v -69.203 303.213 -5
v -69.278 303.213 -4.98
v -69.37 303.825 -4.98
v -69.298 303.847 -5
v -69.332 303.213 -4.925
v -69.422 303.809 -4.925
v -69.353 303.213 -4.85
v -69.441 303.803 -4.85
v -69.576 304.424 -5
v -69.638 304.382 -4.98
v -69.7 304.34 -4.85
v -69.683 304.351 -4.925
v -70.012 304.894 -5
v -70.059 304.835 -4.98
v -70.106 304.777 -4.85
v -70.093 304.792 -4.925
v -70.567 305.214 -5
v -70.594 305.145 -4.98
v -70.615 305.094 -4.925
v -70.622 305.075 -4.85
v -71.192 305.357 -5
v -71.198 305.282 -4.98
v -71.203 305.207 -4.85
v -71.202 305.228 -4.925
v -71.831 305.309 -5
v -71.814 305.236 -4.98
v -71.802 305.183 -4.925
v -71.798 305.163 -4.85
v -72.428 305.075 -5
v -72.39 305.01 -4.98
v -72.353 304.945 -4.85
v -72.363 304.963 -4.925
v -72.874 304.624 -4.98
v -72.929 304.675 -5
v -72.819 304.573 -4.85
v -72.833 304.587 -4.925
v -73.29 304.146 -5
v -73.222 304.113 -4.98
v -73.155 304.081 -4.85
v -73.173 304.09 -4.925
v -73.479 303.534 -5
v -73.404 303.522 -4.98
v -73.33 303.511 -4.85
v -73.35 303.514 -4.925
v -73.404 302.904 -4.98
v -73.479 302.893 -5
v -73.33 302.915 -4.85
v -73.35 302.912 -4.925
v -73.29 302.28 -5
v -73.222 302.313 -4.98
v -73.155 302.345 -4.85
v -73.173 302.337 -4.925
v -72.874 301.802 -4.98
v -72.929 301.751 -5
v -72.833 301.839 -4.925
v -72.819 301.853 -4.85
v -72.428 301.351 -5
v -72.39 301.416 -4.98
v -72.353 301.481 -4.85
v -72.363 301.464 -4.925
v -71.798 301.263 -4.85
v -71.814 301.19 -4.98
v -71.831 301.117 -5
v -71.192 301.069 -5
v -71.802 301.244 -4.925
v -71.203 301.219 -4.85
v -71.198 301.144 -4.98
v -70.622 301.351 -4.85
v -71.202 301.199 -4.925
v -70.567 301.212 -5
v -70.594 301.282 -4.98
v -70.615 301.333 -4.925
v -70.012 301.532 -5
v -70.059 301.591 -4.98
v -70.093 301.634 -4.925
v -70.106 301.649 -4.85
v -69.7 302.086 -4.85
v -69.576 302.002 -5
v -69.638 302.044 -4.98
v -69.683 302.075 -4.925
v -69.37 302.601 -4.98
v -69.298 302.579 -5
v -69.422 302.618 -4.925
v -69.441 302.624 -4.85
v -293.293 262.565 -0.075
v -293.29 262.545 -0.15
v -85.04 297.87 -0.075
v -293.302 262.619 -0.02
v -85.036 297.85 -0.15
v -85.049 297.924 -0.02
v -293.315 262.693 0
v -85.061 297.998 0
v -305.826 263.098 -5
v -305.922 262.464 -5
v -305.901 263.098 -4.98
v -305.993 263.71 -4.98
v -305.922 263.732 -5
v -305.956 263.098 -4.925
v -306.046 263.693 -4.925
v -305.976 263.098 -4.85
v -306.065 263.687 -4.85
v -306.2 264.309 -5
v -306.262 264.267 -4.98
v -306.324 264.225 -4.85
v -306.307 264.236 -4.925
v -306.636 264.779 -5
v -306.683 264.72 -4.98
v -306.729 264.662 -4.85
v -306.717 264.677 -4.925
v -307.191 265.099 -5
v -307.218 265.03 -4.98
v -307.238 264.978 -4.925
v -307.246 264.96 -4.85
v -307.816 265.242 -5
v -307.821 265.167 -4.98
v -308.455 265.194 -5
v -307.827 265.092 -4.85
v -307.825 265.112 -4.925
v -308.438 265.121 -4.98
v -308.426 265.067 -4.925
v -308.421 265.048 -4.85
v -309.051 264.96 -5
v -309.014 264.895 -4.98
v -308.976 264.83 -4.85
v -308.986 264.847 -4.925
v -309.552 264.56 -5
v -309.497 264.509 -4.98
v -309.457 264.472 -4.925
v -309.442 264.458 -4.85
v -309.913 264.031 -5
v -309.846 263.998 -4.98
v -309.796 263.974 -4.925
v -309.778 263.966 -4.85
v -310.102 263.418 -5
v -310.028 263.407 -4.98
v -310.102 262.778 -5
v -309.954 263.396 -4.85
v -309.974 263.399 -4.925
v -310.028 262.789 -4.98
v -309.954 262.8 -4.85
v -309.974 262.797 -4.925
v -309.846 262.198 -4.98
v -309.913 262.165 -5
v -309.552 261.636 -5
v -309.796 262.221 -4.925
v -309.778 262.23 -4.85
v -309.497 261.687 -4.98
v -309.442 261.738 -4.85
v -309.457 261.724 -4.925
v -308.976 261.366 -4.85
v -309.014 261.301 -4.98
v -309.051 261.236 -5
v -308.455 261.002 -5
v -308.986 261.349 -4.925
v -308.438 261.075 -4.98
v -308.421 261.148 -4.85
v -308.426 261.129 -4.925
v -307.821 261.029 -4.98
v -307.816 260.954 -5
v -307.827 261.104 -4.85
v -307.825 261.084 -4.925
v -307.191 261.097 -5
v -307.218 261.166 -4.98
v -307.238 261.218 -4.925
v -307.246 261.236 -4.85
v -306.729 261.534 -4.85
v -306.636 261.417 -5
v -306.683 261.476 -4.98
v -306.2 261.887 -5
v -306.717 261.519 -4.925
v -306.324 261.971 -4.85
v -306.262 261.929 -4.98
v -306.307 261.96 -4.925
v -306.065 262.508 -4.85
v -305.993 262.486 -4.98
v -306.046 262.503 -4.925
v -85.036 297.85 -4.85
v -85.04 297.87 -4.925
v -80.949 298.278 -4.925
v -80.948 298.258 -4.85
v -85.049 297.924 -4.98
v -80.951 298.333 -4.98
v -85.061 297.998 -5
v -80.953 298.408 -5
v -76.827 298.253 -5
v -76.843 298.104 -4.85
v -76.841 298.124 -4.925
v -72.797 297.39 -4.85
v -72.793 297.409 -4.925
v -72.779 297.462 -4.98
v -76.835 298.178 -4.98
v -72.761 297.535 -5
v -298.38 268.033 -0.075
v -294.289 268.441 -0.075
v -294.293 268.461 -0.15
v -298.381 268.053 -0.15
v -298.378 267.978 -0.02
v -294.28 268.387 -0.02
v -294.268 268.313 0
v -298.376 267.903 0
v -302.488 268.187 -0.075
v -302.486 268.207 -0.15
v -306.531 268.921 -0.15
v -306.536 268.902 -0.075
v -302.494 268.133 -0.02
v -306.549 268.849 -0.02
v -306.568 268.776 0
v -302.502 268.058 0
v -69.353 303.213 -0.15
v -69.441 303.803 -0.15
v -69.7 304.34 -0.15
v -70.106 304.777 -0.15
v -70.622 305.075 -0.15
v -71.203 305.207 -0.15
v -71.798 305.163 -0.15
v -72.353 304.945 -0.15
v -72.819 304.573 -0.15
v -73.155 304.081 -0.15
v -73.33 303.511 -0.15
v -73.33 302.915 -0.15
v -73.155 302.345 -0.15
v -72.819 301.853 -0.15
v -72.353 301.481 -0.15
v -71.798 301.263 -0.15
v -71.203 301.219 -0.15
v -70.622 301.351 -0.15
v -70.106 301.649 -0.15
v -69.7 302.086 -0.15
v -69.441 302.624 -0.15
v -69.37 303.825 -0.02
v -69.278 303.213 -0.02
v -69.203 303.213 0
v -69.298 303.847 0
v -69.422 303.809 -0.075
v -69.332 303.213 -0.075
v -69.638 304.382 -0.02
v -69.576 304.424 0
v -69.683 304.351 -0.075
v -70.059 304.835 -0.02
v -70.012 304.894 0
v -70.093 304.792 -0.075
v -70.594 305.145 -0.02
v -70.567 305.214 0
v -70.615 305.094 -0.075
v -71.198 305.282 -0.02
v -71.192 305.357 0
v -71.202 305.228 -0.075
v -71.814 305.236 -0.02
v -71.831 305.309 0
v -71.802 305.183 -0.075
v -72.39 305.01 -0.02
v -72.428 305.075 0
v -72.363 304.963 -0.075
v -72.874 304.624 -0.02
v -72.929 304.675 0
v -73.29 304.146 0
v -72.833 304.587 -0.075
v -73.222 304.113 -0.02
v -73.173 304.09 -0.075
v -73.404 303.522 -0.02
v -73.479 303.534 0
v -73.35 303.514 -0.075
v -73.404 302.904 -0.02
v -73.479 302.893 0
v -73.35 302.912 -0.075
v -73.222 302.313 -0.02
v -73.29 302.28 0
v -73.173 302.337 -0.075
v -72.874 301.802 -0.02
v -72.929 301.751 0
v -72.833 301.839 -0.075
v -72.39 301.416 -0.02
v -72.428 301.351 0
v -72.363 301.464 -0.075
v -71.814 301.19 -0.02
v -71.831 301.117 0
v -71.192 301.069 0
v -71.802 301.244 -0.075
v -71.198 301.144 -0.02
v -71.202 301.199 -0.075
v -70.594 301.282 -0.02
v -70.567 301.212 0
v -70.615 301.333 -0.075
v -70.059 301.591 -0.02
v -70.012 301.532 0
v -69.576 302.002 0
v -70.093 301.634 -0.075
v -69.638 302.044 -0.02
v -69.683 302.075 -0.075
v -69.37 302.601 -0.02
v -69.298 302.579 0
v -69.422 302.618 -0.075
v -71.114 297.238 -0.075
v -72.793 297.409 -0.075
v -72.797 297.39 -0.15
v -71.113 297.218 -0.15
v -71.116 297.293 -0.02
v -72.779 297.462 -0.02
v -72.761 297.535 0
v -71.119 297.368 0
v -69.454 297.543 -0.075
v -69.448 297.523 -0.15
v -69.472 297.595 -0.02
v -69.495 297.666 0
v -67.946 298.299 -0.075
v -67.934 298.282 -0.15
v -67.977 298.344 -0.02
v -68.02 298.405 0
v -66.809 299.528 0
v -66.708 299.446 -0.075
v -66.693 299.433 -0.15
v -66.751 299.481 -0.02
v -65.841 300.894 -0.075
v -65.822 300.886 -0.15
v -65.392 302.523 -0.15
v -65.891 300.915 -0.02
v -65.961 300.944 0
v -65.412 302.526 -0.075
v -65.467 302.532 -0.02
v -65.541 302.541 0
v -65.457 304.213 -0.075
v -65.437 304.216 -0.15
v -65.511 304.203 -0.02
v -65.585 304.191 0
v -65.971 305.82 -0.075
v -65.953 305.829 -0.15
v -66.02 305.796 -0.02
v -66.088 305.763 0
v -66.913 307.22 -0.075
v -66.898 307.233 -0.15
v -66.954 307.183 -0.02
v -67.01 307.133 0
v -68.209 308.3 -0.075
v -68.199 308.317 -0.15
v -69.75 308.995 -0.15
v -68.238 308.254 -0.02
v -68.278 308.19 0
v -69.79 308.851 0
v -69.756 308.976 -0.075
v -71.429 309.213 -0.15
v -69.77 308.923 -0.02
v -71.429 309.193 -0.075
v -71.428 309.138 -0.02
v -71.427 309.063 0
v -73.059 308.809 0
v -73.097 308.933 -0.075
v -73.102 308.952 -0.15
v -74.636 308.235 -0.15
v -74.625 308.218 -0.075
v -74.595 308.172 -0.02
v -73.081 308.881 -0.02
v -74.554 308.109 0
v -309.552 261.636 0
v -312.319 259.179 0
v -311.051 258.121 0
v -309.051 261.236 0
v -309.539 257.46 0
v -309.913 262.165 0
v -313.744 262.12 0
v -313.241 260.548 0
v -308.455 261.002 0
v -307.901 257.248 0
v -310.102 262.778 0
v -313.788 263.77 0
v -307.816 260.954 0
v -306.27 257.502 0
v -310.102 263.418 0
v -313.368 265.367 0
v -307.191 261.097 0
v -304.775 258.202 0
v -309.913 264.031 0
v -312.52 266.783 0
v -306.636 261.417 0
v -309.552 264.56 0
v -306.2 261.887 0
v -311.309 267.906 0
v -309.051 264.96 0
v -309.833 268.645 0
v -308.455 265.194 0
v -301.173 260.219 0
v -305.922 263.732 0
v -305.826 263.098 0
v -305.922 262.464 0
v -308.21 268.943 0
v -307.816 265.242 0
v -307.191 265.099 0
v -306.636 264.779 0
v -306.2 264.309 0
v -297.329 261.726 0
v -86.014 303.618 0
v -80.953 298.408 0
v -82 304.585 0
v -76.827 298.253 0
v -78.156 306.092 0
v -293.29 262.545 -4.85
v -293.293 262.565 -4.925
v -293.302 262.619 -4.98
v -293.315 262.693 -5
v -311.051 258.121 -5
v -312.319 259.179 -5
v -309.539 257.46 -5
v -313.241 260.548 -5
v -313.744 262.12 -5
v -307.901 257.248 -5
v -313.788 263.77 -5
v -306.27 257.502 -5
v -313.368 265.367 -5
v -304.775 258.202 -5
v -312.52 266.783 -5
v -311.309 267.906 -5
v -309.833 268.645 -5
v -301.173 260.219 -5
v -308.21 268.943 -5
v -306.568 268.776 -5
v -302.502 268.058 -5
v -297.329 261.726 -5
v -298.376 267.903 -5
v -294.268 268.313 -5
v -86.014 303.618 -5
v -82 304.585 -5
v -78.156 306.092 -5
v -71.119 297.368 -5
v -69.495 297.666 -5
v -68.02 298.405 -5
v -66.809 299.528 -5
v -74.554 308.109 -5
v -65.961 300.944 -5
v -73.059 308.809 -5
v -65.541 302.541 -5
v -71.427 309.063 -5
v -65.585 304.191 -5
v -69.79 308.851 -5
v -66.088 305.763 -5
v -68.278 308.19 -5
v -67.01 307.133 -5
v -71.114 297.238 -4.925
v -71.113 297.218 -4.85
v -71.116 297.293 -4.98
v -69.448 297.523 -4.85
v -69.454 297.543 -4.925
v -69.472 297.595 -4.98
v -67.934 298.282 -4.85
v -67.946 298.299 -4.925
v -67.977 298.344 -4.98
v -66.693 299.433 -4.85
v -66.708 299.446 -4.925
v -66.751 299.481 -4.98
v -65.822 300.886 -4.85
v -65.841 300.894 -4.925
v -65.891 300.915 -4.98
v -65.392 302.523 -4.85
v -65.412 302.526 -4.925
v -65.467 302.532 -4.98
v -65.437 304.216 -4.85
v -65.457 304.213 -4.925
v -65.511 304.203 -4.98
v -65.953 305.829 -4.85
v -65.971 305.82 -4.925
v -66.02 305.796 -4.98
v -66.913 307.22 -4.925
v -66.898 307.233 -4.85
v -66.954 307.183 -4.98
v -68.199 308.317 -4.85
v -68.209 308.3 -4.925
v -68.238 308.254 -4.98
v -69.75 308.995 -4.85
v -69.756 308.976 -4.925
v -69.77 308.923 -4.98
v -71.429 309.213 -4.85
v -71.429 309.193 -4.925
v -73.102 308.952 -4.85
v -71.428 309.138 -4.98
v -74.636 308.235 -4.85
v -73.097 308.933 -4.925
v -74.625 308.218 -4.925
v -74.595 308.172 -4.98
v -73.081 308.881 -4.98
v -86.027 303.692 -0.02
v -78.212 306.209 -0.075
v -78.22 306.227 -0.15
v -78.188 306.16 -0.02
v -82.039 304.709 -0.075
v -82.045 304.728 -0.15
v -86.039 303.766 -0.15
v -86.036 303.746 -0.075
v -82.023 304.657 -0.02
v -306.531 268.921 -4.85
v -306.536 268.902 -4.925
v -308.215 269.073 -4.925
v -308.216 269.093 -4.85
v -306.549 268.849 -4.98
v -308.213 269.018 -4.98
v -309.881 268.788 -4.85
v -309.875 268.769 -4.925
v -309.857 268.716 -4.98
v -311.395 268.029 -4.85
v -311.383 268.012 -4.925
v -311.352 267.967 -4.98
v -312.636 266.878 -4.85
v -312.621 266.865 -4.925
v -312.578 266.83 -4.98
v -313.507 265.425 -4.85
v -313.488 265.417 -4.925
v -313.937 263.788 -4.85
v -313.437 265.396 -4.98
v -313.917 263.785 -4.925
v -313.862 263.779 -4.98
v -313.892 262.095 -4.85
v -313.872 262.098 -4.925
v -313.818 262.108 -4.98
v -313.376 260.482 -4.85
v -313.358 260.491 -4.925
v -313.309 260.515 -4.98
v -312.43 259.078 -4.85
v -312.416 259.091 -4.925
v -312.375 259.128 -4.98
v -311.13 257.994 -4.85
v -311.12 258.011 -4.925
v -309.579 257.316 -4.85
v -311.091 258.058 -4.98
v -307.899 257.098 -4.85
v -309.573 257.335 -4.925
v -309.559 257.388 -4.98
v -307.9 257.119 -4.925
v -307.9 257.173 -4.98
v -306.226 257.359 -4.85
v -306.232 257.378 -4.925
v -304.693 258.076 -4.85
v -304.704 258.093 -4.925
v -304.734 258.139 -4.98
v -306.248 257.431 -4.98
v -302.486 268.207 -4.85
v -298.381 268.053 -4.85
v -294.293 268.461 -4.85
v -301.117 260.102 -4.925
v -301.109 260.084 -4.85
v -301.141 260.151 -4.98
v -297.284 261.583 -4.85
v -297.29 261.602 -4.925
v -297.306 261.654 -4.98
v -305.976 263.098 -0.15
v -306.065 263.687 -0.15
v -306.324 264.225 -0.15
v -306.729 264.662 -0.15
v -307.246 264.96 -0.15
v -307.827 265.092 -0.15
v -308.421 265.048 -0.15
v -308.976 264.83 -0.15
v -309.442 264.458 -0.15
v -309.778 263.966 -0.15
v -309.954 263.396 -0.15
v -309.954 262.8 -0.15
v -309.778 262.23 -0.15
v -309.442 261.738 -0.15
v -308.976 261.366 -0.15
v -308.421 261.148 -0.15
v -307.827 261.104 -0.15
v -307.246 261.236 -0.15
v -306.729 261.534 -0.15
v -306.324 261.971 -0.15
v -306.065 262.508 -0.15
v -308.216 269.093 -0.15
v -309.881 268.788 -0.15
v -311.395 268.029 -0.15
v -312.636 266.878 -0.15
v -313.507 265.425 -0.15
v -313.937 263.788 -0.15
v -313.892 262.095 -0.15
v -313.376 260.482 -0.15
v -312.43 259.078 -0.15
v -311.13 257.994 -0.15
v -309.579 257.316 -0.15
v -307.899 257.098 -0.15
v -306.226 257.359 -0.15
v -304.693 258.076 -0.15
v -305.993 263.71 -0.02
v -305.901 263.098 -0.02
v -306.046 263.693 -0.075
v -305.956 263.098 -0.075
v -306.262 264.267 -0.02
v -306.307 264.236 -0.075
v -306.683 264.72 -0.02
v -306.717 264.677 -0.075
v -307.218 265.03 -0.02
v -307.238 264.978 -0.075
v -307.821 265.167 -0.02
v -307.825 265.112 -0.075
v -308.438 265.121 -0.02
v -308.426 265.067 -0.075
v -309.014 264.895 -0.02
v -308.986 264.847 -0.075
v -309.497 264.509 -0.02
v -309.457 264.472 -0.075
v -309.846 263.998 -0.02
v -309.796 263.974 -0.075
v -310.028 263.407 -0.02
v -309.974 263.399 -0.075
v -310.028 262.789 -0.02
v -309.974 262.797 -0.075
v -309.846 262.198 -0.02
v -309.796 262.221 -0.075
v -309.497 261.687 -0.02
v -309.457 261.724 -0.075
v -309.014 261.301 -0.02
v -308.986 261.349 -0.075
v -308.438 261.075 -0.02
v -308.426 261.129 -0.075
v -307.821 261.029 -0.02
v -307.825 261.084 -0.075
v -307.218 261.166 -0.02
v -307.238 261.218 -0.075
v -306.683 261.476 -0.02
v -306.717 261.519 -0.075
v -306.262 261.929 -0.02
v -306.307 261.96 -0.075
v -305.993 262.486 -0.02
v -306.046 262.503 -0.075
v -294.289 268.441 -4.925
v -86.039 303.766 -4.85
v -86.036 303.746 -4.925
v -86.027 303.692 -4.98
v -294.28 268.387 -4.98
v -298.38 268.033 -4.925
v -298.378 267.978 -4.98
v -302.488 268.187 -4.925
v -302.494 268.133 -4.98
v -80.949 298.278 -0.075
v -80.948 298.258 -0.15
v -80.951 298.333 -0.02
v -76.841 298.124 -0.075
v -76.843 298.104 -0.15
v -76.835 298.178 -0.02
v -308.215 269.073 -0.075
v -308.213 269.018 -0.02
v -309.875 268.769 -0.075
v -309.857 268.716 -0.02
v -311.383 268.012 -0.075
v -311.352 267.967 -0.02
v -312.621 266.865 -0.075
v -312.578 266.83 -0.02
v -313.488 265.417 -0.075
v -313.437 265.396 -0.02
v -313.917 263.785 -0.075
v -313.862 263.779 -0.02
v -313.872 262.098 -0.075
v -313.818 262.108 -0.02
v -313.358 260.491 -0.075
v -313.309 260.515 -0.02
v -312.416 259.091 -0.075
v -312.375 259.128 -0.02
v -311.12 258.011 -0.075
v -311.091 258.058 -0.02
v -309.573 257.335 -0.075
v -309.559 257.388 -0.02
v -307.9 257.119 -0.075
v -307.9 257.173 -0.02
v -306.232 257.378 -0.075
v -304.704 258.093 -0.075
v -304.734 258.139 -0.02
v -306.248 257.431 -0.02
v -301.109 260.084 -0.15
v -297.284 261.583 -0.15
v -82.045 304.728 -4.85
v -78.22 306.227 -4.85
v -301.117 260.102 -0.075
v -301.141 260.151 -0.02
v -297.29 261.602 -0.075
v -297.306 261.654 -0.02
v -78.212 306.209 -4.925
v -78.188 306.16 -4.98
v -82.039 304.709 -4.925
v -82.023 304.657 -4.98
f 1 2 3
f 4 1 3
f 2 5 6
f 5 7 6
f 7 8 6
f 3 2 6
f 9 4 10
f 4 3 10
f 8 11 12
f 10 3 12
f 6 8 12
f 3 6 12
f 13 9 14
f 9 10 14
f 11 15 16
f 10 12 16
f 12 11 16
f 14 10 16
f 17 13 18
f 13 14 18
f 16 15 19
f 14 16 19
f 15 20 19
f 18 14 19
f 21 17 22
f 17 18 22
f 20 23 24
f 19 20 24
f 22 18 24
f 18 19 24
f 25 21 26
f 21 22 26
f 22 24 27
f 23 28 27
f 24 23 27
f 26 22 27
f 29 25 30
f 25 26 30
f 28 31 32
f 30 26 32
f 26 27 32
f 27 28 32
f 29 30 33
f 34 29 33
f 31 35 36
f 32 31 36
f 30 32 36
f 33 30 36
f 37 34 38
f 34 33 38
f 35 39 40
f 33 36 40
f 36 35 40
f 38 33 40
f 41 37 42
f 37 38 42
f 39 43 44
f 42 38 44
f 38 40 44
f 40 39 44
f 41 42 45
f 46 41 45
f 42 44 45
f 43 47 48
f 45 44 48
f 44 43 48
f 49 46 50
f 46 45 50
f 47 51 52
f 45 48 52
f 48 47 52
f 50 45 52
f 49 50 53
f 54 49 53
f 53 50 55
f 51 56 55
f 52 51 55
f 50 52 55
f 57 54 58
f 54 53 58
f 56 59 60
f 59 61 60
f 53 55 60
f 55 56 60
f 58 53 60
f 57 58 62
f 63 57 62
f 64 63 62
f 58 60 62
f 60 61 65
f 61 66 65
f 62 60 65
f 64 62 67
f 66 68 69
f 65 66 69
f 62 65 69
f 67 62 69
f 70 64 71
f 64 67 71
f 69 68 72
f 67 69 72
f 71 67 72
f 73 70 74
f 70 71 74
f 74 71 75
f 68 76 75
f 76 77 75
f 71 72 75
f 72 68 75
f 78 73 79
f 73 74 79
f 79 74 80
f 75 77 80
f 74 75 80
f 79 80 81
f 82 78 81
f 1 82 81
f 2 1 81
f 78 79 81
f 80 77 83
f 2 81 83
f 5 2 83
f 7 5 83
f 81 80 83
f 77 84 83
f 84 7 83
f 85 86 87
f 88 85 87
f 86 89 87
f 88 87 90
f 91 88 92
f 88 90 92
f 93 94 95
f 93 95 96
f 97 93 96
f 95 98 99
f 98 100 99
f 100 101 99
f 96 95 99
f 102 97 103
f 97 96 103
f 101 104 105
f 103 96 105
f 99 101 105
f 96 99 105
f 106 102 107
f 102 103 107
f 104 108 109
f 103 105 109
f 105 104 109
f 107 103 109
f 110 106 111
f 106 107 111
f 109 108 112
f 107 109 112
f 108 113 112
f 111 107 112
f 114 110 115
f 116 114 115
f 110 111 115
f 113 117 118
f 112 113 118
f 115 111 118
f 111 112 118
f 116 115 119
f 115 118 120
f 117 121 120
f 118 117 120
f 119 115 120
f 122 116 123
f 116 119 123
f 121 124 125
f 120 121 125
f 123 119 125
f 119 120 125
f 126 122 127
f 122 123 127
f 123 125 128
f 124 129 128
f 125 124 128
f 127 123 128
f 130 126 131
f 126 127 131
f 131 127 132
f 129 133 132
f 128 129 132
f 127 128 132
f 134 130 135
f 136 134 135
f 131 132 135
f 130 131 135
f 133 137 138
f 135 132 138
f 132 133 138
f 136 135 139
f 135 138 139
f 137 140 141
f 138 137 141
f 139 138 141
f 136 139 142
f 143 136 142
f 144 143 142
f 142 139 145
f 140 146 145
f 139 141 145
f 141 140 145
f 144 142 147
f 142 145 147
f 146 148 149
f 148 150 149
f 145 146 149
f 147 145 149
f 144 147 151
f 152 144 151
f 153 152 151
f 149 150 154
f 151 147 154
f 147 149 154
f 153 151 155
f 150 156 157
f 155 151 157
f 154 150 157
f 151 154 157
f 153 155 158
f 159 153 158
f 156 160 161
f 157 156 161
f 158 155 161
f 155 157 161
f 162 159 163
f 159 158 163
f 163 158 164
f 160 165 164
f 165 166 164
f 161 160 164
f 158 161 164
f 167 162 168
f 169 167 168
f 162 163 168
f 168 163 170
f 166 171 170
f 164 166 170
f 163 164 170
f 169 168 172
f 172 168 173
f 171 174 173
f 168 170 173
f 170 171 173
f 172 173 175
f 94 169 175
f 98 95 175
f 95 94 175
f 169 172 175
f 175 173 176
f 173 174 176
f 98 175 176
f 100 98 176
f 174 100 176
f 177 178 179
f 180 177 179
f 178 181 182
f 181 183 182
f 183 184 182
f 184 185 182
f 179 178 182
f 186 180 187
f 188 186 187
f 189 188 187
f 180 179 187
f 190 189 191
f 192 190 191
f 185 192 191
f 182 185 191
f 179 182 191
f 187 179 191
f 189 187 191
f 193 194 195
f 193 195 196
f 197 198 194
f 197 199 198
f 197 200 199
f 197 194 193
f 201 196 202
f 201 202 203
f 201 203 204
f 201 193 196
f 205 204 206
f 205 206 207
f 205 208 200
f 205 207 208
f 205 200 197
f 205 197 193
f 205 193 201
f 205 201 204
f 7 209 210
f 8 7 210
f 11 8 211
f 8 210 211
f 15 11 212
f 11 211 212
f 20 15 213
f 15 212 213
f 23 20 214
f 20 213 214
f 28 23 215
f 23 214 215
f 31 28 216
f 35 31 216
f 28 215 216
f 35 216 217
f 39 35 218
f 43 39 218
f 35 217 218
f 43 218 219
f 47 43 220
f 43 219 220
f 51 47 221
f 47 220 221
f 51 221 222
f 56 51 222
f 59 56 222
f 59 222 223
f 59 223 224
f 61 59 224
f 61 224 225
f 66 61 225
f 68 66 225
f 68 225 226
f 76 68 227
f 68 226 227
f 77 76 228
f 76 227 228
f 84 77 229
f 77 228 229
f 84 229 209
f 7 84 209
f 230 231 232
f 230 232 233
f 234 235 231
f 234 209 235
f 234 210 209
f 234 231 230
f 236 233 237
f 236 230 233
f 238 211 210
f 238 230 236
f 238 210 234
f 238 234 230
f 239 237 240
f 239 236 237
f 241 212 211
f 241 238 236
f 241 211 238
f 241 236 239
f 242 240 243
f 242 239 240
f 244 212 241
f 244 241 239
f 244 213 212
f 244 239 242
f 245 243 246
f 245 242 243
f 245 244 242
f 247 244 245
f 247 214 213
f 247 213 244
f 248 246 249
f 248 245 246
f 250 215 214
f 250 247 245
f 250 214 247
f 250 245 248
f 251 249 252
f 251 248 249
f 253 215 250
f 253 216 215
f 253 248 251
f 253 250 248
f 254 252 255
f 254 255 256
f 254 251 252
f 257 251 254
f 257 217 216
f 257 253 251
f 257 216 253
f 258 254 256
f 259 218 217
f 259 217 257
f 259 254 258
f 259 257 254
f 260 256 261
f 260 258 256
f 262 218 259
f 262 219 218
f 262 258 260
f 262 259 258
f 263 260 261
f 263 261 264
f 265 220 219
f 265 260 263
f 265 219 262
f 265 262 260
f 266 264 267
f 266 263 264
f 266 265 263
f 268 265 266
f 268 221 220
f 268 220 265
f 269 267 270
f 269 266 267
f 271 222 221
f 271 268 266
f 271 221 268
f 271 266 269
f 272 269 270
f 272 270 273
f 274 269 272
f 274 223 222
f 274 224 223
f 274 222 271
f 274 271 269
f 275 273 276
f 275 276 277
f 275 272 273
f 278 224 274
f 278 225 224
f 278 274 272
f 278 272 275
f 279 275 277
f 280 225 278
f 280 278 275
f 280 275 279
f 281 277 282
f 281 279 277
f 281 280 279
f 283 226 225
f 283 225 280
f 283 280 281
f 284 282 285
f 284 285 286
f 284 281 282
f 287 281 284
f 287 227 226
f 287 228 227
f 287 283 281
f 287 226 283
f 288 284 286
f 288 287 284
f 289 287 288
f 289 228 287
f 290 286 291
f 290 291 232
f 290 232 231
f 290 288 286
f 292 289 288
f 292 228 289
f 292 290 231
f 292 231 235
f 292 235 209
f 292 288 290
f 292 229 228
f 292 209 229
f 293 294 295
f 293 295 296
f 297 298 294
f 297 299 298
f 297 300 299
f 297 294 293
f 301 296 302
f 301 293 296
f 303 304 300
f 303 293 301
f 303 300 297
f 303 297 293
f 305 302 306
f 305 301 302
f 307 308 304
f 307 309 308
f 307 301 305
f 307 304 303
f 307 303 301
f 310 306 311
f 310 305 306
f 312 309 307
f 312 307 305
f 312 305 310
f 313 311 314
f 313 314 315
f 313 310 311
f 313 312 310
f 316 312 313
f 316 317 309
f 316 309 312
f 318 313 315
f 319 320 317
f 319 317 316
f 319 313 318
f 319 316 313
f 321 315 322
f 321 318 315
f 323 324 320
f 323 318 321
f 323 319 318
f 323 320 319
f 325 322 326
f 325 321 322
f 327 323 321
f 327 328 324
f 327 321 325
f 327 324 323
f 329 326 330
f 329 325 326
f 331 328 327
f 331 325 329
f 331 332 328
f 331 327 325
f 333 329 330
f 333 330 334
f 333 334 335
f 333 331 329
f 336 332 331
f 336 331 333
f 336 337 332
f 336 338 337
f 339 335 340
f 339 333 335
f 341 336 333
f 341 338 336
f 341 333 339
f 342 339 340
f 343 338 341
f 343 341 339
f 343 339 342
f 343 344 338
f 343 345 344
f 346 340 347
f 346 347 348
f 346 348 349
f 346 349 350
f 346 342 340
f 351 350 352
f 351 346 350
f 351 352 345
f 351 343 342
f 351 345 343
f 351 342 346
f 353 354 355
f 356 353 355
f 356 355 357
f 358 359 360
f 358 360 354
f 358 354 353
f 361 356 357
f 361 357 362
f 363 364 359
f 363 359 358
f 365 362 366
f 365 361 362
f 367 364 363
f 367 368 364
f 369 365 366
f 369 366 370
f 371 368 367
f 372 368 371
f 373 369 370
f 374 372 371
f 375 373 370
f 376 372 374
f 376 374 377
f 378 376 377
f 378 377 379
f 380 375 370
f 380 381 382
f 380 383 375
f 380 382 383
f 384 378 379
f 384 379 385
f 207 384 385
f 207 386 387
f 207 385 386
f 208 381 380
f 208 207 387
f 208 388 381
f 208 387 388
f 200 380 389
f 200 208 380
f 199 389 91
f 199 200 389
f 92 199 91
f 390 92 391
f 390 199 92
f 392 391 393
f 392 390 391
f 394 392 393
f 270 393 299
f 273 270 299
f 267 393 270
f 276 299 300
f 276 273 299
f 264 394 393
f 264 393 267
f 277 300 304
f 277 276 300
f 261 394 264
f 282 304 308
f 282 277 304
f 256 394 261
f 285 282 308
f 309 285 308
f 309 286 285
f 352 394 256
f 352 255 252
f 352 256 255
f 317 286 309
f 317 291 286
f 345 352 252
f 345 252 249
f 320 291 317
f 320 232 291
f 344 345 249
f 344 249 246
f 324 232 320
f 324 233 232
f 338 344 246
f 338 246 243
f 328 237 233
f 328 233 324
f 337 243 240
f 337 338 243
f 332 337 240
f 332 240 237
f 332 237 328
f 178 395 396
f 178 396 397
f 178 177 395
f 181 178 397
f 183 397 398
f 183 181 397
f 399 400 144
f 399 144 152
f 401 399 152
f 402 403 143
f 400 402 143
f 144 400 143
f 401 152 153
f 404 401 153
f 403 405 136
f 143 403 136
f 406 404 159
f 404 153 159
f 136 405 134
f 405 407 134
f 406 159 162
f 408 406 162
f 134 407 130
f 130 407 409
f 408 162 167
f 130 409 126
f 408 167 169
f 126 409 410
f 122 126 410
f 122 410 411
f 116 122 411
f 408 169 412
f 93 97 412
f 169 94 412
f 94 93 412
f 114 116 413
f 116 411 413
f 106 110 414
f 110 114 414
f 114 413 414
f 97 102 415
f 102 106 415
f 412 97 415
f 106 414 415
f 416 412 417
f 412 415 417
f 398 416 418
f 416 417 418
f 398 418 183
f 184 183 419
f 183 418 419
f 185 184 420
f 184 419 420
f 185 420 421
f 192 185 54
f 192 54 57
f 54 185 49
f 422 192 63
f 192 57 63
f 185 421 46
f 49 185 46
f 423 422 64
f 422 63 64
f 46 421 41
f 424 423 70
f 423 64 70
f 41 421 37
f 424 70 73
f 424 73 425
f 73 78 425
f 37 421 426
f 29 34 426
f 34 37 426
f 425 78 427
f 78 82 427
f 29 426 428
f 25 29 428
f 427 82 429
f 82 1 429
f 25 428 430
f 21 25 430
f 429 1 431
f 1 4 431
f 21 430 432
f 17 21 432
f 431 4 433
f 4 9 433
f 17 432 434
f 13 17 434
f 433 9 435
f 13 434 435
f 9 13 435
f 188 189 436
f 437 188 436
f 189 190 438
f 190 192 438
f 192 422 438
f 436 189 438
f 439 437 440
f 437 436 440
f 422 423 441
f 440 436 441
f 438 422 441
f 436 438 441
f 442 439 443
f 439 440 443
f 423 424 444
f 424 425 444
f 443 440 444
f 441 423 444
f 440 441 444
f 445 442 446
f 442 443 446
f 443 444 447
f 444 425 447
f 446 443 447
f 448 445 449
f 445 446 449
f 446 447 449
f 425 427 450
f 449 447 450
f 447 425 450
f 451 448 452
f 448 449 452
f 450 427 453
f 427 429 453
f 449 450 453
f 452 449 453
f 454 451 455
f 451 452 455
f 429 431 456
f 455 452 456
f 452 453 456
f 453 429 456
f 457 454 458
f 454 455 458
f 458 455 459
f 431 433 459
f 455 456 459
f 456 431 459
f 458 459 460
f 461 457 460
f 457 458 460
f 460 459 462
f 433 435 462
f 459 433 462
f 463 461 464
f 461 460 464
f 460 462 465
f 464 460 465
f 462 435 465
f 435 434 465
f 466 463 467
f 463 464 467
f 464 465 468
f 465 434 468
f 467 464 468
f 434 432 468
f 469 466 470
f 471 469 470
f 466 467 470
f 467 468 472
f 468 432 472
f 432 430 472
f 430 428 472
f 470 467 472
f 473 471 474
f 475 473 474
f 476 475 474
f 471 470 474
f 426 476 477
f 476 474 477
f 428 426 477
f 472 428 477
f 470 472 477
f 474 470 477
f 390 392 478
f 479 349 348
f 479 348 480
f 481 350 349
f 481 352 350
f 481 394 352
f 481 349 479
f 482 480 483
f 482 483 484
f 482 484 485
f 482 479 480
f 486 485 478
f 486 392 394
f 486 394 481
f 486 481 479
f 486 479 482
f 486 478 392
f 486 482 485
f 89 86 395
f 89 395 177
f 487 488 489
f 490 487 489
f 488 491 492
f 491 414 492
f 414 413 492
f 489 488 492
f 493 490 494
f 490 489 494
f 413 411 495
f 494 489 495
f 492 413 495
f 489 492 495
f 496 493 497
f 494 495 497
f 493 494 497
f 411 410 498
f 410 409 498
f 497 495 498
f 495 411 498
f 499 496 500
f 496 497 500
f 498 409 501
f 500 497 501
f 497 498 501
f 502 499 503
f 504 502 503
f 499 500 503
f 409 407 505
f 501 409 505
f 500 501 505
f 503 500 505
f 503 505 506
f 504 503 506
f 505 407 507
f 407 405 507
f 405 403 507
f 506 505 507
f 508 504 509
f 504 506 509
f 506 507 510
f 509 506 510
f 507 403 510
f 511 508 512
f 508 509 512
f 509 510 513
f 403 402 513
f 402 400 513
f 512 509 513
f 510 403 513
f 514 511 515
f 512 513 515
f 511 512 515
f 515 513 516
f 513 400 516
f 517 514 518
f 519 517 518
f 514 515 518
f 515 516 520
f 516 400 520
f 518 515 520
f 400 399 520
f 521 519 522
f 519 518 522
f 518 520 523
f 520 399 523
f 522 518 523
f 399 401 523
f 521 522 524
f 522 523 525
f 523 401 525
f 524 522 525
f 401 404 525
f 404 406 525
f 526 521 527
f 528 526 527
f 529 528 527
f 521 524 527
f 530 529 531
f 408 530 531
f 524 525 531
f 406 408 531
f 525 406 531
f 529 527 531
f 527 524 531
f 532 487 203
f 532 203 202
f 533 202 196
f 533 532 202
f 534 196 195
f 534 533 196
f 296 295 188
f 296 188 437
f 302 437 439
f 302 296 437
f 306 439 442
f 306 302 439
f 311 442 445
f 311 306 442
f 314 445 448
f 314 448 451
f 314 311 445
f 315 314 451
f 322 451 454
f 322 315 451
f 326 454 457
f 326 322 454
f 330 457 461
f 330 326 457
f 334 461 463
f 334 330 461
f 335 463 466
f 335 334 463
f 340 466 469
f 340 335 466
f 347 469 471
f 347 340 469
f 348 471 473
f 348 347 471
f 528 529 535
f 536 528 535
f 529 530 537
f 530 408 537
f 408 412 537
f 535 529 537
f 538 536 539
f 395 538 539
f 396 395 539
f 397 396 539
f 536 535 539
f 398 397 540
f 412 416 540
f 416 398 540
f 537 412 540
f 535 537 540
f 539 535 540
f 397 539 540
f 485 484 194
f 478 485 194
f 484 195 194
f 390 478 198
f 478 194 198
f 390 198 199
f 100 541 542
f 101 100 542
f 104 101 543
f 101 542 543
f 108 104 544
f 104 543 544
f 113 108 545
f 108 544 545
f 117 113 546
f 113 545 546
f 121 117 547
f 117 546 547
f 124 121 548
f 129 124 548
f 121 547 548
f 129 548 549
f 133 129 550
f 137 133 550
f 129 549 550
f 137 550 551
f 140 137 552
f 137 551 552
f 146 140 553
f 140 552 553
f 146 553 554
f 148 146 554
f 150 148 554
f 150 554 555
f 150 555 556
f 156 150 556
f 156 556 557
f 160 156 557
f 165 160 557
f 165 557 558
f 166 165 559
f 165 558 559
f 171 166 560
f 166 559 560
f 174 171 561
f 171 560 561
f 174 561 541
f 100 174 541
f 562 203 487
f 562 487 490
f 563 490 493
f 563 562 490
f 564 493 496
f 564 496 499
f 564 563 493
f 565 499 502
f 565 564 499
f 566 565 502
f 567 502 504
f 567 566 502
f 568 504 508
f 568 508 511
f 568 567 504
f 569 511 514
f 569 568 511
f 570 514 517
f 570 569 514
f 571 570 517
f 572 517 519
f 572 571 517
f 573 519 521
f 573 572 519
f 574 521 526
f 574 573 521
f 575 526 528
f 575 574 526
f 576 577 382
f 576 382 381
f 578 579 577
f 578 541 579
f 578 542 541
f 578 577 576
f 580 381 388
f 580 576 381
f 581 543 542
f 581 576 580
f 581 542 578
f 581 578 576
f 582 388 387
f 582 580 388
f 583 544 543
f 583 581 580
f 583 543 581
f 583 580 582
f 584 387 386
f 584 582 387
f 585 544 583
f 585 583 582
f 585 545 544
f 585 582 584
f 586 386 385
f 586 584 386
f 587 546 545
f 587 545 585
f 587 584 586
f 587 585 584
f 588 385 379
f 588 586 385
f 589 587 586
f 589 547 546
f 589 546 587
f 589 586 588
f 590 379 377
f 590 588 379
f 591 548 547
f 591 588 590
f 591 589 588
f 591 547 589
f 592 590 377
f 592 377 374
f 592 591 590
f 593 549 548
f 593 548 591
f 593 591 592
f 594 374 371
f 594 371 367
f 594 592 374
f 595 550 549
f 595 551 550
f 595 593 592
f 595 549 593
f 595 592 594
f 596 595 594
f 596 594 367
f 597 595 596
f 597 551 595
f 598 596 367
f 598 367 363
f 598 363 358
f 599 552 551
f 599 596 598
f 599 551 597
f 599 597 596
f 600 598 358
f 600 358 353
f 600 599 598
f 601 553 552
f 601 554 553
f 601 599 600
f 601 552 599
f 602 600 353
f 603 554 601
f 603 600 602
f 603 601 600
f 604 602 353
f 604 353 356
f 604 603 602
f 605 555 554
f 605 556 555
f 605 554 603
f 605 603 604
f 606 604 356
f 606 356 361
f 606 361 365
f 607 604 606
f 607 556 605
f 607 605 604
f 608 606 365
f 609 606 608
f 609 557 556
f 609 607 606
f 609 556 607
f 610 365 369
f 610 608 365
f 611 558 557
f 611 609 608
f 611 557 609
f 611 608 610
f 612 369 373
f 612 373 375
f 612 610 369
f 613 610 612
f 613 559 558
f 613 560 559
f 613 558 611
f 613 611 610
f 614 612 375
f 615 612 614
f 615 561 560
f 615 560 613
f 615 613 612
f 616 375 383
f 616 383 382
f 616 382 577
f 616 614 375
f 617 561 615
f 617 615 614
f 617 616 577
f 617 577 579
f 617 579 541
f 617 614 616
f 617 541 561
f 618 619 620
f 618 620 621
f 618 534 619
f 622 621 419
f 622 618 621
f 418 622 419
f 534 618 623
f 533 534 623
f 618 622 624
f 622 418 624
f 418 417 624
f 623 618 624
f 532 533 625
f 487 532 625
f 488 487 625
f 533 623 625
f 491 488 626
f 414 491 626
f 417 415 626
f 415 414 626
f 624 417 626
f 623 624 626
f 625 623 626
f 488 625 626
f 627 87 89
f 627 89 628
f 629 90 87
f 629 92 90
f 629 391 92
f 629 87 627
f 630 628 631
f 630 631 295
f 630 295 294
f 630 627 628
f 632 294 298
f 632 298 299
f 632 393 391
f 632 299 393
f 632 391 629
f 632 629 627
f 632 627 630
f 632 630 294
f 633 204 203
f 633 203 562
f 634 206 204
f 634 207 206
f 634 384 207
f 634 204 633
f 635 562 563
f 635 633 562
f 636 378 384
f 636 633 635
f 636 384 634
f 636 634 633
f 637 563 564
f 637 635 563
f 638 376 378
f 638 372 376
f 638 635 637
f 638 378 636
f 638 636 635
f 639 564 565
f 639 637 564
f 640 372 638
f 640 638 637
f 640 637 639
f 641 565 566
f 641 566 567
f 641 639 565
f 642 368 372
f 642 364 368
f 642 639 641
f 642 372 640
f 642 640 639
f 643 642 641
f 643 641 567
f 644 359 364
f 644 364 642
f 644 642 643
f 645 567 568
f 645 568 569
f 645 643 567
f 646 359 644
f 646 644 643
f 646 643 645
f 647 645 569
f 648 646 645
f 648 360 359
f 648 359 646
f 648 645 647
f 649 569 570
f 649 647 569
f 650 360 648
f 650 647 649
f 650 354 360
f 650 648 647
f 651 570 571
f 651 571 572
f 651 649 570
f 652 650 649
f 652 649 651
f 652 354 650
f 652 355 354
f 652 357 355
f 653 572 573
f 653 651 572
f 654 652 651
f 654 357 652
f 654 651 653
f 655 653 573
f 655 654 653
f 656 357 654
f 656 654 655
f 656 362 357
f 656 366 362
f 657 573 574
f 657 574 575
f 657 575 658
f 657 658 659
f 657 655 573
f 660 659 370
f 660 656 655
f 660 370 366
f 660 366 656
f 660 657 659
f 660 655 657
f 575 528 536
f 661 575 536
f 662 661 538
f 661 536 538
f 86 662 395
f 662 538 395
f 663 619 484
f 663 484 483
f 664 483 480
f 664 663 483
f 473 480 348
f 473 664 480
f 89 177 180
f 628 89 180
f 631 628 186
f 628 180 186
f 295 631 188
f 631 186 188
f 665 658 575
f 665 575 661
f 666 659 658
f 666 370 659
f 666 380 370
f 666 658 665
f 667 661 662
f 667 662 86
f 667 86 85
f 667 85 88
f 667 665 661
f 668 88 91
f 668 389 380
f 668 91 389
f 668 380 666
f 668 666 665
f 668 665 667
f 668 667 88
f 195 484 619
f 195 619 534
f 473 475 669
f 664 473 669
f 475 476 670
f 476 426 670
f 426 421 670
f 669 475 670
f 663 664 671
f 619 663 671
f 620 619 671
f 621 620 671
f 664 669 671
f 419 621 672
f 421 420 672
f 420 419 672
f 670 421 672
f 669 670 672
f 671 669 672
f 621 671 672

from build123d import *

# Parameters (mm, degrees)
SKETCH1_R           = 2
BOSS_EXTRUDE1_DEPTH = 5
FILLET1_R           = 30
FILLET2_R           = 0.15


with BuildPart() as part:
    # Sketch1 → Boss-Extrude1 (new body)
    with BuildSketch(Plane.XY):
        with BuildLine():
            ThreePointArc((-303.354663584, 266.924296542), (-313.891870914, 262.09510502), (-302.35178592, 261.008703893))
            Line((-302.35178592, 261.008703893), (-75.974186977, 299.386775376))
            ThreePointArc((-75.974186977, 299.386775376), (-65.436979647, 304.215966898), (-76.97706464, 305.302368025))
            Line((-76.97706464, 305.302368025), (-303.354663584, 266.924296542))
        make_face()
        with Locations((-307.976278265, 263.097982683)):
            Circle(SKETCH1_R, mode=Mode.SUBTRACT)
        with Locations((-71.352572296, 303.213089234)):
            Circle(SKETCH1_R, mode=Mode.SUBTRACT)
    extrude(amount=-BOSS_EXTRUDE1_DEPTH)

    # Fillet1
    fillet1_edges = [part.edges().sort_by_distance(p)[0] for p in [
        (-303.354663584, 266.924296542, -2.5),
        (-76.97706464, 305.302368025, -2.5),
        (-75.974186977, 299.386775376, -2.5),
        (-302.35178592, 261.008703893, -2.5),
    ]]
    fillet(fillet1_edges, radius=FILLET1_R)

    # Fillet2
    fillet2_edges = [part.edges().sort_by_distance(p)[0] for p in [
        (-313.891870914, 262.09510502, 0),
        (-313.891870914, 262.09510502, -5),
        (-189.162986448, 280.197739634, 0),
        (-189.162986448, 280.197739634, -5),
        (-65.436979647, 304.215966898, 0),
        (-309.976278265, 263.097982683, -5),
        (-65.436979647, 304.215966898, -5),
        (-190.165864112, 286.113332283, 0),
        (-190.165864112, 286.113332283, -5),
        (-299.221745151, 260.898681077, 0),
        (-299.221745151, 260.898681077, -5),
        (-73.352572296, 303.213089234, -5),
        (-78.893071958, 298.251270772, 0),
        (-78.893071958, 298.251270772, -5),
        (-80.107105409, 305.41239084, 0),
        (-80.107105409, 305.41239084, -5),
        (-300.435778603, 268.059801145, 0),
        (-300.435778603, 268.059801145, -5),
        (-73.352572296, 303.213089234, 0),
        (-309.976278265, 263.097982683, 0),
    ]]
    fillet(fillet2_edges, radius=FILLET2_R)


solid = part.part
